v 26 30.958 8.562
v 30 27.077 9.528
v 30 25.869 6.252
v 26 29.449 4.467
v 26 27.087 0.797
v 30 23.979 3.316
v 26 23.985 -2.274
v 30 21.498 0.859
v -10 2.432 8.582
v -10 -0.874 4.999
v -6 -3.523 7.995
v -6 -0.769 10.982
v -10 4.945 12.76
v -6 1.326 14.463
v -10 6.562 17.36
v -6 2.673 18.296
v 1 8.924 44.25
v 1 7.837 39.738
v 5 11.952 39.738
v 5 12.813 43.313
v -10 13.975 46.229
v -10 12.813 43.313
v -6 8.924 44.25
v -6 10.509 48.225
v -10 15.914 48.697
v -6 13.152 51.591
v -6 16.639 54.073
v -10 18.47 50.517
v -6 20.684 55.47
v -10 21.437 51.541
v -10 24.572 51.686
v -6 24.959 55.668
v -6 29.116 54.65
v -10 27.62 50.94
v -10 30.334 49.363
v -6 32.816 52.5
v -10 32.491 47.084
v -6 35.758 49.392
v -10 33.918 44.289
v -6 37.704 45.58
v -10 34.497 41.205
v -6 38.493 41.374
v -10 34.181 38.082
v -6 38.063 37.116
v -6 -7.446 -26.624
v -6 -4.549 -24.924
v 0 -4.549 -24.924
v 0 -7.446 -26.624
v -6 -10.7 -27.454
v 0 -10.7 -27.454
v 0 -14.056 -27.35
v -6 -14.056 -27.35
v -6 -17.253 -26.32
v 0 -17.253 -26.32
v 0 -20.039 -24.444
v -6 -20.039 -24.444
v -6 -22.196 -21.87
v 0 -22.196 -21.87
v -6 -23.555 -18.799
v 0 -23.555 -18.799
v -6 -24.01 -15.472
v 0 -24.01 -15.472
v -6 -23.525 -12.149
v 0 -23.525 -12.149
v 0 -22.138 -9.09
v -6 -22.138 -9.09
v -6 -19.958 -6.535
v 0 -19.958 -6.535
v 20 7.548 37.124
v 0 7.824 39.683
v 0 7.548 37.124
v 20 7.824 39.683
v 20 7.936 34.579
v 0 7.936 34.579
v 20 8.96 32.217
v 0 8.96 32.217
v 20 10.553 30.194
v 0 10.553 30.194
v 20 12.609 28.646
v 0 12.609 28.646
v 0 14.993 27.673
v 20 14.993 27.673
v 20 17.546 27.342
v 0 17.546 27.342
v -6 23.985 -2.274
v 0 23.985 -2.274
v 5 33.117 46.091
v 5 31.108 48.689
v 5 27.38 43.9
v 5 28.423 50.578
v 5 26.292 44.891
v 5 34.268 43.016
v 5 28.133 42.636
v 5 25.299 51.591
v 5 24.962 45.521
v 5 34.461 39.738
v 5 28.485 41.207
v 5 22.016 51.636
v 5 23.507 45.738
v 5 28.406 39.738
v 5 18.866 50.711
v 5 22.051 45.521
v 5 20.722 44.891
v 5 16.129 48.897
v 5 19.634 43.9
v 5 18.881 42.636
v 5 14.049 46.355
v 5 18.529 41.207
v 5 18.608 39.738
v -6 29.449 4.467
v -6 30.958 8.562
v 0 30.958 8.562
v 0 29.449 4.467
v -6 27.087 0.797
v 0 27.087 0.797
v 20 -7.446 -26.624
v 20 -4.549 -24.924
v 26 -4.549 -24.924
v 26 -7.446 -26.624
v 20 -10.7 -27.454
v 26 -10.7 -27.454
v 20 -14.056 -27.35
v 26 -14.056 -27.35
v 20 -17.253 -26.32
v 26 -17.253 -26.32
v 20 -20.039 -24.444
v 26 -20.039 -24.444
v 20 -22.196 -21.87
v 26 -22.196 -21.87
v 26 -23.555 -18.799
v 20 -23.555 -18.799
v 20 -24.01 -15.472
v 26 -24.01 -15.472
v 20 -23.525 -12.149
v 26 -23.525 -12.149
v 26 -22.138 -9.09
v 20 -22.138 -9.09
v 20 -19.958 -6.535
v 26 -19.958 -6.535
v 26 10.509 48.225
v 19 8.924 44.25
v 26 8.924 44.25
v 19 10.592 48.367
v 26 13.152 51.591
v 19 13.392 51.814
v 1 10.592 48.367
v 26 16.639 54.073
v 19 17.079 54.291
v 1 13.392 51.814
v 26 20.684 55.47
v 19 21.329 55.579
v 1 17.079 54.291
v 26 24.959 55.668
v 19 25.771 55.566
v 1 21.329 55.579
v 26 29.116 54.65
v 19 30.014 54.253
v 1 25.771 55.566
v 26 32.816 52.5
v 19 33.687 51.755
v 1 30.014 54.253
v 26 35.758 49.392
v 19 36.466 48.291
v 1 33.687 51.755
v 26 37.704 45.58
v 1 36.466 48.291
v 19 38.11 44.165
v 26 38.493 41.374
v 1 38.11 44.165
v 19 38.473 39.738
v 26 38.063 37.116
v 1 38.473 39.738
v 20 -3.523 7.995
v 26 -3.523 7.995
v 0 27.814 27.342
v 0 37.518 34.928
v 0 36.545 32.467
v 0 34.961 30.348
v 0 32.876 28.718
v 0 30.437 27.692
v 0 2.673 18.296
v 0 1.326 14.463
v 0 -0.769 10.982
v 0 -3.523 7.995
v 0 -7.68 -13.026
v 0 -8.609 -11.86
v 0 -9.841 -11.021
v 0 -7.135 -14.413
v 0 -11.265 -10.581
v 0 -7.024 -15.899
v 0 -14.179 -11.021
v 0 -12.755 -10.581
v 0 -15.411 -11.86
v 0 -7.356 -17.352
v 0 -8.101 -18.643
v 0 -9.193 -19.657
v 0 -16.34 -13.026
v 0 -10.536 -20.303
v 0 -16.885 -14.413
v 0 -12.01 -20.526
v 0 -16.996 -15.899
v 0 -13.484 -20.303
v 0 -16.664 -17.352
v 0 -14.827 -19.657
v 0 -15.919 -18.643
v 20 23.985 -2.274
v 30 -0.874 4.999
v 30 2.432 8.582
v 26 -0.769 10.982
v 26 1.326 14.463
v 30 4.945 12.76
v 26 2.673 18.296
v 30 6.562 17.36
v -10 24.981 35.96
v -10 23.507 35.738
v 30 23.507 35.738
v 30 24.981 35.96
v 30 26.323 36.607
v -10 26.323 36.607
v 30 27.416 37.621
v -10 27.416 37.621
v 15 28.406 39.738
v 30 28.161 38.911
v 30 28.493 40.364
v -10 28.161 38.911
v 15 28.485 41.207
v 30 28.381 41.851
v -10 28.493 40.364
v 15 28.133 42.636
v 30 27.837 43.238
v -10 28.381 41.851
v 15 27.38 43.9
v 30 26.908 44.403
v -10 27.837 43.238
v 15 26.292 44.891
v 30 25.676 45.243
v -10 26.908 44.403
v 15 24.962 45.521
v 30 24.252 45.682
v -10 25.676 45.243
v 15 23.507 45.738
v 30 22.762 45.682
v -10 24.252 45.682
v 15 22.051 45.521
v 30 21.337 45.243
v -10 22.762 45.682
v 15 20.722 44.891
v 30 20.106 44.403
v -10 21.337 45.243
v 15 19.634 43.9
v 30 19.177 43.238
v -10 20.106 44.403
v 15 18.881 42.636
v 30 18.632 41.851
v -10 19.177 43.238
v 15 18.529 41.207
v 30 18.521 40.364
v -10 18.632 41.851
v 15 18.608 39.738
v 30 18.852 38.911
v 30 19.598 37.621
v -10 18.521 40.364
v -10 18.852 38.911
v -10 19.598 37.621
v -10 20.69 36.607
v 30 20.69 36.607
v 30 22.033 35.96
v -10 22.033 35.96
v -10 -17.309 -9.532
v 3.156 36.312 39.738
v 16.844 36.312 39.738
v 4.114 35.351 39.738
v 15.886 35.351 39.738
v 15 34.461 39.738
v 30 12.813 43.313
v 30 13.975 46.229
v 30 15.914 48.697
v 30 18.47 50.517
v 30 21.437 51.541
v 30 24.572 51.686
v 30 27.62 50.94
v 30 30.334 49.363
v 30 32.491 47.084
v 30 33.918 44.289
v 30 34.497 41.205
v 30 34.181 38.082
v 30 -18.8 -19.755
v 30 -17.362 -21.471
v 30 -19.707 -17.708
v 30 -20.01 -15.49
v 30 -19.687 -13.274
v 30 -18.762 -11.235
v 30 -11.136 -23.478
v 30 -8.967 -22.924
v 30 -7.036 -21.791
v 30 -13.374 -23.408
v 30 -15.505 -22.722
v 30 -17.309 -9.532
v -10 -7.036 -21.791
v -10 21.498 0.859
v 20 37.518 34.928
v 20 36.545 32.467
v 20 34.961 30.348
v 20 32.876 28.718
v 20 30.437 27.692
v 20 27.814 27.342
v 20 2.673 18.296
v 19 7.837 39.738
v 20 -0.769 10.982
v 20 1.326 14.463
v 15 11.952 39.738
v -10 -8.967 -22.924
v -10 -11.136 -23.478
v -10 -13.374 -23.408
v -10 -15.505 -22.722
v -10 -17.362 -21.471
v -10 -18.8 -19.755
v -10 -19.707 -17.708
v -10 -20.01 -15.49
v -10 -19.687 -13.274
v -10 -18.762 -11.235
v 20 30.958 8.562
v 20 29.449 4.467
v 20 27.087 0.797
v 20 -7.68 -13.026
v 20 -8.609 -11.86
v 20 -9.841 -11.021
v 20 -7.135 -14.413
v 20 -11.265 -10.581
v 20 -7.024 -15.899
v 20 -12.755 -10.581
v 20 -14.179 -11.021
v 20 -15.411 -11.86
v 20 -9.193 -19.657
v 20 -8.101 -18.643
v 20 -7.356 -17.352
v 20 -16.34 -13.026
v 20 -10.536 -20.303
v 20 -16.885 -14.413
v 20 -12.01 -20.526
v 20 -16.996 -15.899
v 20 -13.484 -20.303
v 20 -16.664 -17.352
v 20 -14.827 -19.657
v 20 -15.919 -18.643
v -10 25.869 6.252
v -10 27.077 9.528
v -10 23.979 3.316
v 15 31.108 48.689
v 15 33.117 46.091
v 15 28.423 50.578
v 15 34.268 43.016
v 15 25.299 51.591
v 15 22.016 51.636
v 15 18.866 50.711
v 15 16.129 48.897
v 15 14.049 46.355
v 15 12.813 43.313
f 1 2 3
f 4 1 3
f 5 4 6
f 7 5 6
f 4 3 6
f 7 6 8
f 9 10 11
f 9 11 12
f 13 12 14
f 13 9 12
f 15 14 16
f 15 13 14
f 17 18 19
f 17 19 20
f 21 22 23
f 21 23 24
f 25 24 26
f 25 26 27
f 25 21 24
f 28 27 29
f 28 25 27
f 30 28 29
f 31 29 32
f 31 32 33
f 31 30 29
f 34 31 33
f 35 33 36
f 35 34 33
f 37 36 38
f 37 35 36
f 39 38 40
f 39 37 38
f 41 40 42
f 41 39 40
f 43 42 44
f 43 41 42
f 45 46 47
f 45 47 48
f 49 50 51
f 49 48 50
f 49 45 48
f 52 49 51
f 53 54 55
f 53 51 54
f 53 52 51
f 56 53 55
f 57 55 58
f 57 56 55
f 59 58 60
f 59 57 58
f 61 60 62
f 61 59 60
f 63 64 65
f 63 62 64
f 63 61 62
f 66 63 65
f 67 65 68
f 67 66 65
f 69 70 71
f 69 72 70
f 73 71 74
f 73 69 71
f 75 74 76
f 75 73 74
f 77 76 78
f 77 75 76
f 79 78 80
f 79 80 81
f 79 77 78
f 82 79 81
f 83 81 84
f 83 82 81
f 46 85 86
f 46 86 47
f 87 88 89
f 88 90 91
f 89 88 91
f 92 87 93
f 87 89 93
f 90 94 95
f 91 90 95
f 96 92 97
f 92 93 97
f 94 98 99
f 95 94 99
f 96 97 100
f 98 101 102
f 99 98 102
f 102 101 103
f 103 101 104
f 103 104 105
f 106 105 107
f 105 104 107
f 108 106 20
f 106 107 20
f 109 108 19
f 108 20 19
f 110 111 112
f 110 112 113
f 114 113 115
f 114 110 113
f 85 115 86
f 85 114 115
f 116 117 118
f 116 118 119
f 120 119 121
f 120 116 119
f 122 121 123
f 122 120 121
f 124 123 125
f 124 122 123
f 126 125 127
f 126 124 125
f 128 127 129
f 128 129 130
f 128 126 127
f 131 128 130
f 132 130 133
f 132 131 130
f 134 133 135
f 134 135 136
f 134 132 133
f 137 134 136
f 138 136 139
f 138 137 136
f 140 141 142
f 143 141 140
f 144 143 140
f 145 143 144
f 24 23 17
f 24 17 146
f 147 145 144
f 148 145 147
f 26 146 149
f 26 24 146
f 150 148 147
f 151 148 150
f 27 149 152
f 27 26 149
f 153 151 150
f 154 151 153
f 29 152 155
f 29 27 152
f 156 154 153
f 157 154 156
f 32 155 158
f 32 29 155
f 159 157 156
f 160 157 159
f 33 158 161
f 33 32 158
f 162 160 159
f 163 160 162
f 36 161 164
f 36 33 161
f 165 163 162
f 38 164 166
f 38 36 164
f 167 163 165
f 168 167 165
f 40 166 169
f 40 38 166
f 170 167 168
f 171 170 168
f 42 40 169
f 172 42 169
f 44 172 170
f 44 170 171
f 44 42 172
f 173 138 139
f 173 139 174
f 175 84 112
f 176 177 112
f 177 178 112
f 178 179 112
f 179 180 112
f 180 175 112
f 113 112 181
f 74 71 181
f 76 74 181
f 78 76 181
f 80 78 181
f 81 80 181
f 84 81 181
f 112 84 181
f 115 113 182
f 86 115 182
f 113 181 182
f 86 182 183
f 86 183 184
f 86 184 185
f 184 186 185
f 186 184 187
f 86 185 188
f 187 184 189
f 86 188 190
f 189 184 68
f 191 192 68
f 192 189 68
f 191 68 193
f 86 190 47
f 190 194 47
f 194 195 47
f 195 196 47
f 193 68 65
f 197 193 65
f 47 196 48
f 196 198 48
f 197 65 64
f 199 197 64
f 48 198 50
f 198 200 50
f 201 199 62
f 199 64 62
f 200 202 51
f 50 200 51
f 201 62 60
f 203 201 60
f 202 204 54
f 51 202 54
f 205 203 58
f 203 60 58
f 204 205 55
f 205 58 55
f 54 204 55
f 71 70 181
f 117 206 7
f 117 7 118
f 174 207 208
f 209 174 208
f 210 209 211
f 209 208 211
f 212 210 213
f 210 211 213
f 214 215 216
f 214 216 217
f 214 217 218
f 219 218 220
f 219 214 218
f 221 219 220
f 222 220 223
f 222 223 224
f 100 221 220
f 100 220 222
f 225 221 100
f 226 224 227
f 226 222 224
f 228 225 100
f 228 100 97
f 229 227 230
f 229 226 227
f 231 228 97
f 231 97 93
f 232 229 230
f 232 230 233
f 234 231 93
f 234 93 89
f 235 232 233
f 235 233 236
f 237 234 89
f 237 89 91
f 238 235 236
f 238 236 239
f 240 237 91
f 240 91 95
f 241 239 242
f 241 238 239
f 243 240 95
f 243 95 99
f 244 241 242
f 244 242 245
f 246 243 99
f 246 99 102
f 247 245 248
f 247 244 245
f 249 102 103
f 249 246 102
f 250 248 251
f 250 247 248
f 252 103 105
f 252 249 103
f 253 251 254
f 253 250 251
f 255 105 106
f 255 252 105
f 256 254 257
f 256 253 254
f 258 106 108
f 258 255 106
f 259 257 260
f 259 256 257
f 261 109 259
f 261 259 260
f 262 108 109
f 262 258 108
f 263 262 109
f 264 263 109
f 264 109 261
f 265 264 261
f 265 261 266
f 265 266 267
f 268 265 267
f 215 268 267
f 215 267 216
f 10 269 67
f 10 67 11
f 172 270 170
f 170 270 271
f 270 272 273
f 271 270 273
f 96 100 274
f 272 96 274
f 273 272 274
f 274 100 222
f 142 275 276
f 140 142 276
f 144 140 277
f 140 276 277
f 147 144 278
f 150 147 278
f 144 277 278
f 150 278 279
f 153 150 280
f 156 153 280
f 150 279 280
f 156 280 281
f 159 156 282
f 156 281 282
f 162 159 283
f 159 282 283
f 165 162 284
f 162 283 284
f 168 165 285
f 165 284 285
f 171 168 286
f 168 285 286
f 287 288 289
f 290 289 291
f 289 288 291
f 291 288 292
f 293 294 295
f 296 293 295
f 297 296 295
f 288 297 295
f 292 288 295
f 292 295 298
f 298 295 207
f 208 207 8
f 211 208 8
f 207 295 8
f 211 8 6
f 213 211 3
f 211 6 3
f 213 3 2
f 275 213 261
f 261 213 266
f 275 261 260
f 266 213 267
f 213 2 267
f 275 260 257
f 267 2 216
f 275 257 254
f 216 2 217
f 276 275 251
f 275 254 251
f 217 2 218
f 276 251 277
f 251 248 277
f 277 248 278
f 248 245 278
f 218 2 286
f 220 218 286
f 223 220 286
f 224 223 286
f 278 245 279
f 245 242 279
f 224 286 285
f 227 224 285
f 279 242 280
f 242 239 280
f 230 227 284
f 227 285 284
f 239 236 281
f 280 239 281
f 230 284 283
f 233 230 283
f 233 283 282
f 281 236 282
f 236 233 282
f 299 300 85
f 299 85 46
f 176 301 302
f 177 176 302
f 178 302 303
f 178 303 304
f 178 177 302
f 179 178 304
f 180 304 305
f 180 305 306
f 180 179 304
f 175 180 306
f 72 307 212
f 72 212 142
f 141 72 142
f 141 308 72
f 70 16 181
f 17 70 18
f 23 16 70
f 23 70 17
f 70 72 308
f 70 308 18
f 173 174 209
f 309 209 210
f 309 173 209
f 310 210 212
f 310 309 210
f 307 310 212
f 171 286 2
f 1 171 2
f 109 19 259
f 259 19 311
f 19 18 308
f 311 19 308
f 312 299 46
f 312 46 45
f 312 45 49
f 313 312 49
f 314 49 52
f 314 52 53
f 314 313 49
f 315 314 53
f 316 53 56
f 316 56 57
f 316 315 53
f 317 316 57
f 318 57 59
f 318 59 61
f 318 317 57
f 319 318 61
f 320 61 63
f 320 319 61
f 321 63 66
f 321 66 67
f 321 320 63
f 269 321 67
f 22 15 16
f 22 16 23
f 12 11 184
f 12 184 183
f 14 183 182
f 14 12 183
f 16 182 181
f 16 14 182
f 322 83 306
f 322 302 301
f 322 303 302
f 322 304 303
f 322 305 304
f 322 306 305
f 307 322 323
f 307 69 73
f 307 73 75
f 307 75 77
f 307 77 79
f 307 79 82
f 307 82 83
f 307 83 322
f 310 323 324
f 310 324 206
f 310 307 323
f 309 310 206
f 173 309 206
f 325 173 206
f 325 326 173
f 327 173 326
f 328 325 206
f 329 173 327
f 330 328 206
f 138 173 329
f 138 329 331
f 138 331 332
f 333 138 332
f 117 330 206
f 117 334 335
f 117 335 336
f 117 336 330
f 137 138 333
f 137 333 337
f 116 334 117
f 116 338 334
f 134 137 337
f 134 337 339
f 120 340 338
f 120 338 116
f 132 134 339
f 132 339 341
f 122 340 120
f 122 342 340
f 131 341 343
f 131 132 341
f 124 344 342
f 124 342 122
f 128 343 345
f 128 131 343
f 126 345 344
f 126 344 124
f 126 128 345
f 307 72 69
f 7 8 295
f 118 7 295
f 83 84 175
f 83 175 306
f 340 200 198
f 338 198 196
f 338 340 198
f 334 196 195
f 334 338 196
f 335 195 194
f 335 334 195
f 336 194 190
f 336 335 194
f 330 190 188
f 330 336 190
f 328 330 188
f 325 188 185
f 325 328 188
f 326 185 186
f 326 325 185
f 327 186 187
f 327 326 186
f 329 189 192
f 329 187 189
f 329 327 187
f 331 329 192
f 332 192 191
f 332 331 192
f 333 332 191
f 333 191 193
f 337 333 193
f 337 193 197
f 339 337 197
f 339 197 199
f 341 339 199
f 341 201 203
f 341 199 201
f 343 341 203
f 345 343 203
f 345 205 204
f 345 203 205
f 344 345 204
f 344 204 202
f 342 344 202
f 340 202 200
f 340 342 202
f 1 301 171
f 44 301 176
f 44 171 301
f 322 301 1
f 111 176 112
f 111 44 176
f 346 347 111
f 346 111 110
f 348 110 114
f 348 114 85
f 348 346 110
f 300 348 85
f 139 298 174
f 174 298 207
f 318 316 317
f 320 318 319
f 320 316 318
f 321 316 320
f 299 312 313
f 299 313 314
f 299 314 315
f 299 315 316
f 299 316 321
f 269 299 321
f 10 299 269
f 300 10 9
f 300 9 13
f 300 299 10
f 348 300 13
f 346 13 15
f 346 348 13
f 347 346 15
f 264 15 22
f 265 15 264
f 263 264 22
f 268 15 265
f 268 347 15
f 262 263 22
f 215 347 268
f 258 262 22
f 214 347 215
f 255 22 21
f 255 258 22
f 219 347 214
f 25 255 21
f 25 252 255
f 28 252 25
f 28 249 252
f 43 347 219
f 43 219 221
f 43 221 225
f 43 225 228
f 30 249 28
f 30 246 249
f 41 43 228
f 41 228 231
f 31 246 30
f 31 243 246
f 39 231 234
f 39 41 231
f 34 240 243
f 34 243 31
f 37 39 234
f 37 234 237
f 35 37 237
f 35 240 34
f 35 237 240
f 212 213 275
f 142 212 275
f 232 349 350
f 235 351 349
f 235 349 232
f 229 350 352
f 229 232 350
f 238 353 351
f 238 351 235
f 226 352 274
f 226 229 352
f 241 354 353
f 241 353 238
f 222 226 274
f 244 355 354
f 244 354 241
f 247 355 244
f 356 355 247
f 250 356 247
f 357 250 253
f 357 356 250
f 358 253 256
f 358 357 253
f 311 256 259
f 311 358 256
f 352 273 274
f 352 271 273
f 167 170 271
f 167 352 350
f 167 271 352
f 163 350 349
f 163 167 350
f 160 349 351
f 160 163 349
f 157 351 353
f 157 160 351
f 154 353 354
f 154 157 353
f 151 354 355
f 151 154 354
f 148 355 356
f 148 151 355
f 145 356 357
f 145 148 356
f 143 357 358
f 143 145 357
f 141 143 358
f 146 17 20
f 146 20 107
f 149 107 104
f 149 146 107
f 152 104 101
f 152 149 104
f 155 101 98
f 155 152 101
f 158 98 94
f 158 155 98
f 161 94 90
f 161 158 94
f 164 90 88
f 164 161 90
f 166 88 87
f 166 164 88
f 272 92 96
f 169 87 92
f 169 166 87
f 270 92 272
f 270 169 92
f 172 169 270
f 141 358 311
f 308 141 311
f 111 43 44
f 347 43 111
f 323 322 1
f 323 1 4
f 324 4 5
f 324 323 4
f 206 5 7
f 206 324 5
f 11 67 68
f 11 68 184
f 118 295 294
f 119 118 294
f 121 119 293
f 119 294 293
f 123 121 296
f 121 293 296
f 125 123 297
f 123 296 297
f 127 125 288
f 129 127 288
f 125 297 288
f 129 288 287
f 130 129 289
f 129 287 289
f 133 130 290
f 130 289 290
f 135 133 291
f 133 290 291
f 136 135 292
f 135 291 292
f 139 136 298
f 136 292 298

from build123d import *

# Parameters (mm, degrees)
SKETCH1_R               = 2.5
BOSS_EXTRUDE1_DEPTH     = 20
SKETCH2_W               = 10
SKETCH2_H               = 31.25301739
CUT_EXTRUDE1_DEPTH      = 26.258397403
CUT_EXTRUDE1_DEPTH_BACK = 7
FILLET1_R               = 5
CHAMFER1_SIZE           = 2
SKETCH4_R               = 2.5
BOSS_EXTRUDE2_DEPTH     = 20
SKETCH5_W               = 5
SKETCH5_H               = 8
CUT_EXTRUDE2_DEPTH      = 26.258397403
CUT_EXTRUDE2_DEPTH_BACK = 7
CHAMFER2_SIZE           = 2
SCALE1_SCALE            = 2


with BuildPart() as part:
    # Sketch1 → Boss-Extrude1 (new body)
    with BuildSketch(Plane(origin=(0, 0, 0), x_dir=(0, 0, -1), z_dir=(1, 0, 0))):
        with BuildLine():
            Line((-26.320929868, 25.036498407), (-12.043816775, 21.484201108))
            ThreePointArc((-12.043816775, 21.484201108), (-9.046440649, 20.189090541), (-6.626054873, 17.99744556))
            Line((-6.626054873, 17.99744556), (4.699352175, 3.730427474))
            ThreePointArc((4.699352175, 3.730427474), (3.853673118, -4.598826318), (-4.495069155, -3.974211028))
            Line((-4.495069155, -3.974211028), (-11.760416857, 4.243329543))
            ThreePointArc((-11.760416857, 4.243329543), (-14.097354711, 6.188634088), (-16.910883072, 7.341693702))
            Line((-16.910883072, 7.341693702), (-29.887785442, 10.466860499))
            ThreePointArc((-29.887785442, 10.466860499), (-35.416669297, 19.541837843), (-26.320929868, 25.036498407))
        make_face()
        Circle(SKETCH1_R, mode=Mode.SUBTRACT)
        with Locations((-28.13179866, 17.758397403)):
            Circle(SKETCH1_R, mode=Mode.SUBTRACT)
    extrude(amount=BOSS_EXTRUDE1_DEPTH)

    # Sketch2 → Cut-Extrude1 (cut, two sides)
    with BuildSketch(Plane(origin=(0, 0, 0), x_dir=(1, 0, 0), z_dir=(0, 1, 0))) as cut_extrude1_sk:
        with Locations((10, -5.807345092)):
            Rectangle(SKETCH2_W, SKETCH2_H)
    extrude(amount=CUT_EXTRUDE1_DEPTH, mode=Mode.SUBTRACT)
    extrude(cut_extrude1_sk.sketch, amount=-CUT_EXTRUDE1_DEPTH_BACK, mode=Mode.SUBTRACT)

    # Fillet1
    fillet1_edges = [part.edges().sort_by_distance(p)[0] for p in [
        (10, 23.820541998, 21.433853787),
        (10, 8.430939618, 21.433853787),
    ]]
    fillet(fillet1_edges, radius=FILLET1_R)

    # Chamfer1
    chamfer1_edges = [part.edges().sort_by_distance(p)[0] for p in [
        (20, 6.188634088, 14.097354711),
        (0, 8.904277101, 23.399334257),
        (0, 19.541837843, 35.416669297),
        (20, 0.134559258, 8.127743006),
        (20, -4.598826318, -3.853673118),
        (20, 10.863936517, 0.963351349),
        (20, 20.189090541, 9.046440649),
        (20, 23.260349758, 19.182373322),
        (20, 19.541837843, 35.416669297),
        (20, 8.904277101, 23.399334257),
        (0, 23.260349758, 19.182373322),
        (0, 20.189090541, 9.046440649),
        (0, 10.863936517, 0.963351349),
        (0, -4.598826318, -3.853673118),
        (0, 0.134559258, 8.127743006),
        (0, 6.188634088, 14.097354711),
    ]]
    chamfer(chamfer1_edges, length=CHAMFER1_SIZE)

    # Sketch4 → Boss-Extrude2 (add)
    with BuildSketch(Plane(origin=(20, 0, 0), x_dir=(0, 0, -1), z_dir=(1, 0, 0))):
        Circle(SKETCH4_R)
    extrude(amount=-BOSS_EXTRUDE2_DEPTH)

    # Sketch5 → Cut-Extrude2 (cut, two sides)
    with BuildSketch(Plane(origin=(0, 0, 0), x_dir=(1, 0, 0), z_dir=(0, 1, 0))) as cut_extrude2_sk:
        with Locations((10, -31.63179866)):
            Rectangle(SKETCH5_W, SKETCH5_H)
    extrude(amount=CUT_EXTRUDE2_DEPTH, mode=Mode.SUBTRACT)
    extrude(cut_extrude2_sk.sketch, amount=-CUT_EXTRUDE2_DEPTH_BACK, mode=Mode.SUBTRACT)

    # Chamfer2
    chamfer2_edges = [part.edges().sort_by_distance(p)[0] for p in [
        (7.5, 18.890459141, 35.545868812),
        (7.5, 10.195211119, 28.759792051),
        (12.5, 18.890459141, 35.545868812),
        (12.5, 10.195211119, 28.759792051),
    ]]
    chamfer(chamfer2_edges, length=CHAMFER2_SIZE)


with BuildPart() as part_1:
    # Scale1: scaled about (10, 12.009955127, 15.525619082)
    add(part.part.scale(SCALE1_SCALE).moved(Location((-10, -12.009955127, -15.525619082))))


solid = part_1.part
